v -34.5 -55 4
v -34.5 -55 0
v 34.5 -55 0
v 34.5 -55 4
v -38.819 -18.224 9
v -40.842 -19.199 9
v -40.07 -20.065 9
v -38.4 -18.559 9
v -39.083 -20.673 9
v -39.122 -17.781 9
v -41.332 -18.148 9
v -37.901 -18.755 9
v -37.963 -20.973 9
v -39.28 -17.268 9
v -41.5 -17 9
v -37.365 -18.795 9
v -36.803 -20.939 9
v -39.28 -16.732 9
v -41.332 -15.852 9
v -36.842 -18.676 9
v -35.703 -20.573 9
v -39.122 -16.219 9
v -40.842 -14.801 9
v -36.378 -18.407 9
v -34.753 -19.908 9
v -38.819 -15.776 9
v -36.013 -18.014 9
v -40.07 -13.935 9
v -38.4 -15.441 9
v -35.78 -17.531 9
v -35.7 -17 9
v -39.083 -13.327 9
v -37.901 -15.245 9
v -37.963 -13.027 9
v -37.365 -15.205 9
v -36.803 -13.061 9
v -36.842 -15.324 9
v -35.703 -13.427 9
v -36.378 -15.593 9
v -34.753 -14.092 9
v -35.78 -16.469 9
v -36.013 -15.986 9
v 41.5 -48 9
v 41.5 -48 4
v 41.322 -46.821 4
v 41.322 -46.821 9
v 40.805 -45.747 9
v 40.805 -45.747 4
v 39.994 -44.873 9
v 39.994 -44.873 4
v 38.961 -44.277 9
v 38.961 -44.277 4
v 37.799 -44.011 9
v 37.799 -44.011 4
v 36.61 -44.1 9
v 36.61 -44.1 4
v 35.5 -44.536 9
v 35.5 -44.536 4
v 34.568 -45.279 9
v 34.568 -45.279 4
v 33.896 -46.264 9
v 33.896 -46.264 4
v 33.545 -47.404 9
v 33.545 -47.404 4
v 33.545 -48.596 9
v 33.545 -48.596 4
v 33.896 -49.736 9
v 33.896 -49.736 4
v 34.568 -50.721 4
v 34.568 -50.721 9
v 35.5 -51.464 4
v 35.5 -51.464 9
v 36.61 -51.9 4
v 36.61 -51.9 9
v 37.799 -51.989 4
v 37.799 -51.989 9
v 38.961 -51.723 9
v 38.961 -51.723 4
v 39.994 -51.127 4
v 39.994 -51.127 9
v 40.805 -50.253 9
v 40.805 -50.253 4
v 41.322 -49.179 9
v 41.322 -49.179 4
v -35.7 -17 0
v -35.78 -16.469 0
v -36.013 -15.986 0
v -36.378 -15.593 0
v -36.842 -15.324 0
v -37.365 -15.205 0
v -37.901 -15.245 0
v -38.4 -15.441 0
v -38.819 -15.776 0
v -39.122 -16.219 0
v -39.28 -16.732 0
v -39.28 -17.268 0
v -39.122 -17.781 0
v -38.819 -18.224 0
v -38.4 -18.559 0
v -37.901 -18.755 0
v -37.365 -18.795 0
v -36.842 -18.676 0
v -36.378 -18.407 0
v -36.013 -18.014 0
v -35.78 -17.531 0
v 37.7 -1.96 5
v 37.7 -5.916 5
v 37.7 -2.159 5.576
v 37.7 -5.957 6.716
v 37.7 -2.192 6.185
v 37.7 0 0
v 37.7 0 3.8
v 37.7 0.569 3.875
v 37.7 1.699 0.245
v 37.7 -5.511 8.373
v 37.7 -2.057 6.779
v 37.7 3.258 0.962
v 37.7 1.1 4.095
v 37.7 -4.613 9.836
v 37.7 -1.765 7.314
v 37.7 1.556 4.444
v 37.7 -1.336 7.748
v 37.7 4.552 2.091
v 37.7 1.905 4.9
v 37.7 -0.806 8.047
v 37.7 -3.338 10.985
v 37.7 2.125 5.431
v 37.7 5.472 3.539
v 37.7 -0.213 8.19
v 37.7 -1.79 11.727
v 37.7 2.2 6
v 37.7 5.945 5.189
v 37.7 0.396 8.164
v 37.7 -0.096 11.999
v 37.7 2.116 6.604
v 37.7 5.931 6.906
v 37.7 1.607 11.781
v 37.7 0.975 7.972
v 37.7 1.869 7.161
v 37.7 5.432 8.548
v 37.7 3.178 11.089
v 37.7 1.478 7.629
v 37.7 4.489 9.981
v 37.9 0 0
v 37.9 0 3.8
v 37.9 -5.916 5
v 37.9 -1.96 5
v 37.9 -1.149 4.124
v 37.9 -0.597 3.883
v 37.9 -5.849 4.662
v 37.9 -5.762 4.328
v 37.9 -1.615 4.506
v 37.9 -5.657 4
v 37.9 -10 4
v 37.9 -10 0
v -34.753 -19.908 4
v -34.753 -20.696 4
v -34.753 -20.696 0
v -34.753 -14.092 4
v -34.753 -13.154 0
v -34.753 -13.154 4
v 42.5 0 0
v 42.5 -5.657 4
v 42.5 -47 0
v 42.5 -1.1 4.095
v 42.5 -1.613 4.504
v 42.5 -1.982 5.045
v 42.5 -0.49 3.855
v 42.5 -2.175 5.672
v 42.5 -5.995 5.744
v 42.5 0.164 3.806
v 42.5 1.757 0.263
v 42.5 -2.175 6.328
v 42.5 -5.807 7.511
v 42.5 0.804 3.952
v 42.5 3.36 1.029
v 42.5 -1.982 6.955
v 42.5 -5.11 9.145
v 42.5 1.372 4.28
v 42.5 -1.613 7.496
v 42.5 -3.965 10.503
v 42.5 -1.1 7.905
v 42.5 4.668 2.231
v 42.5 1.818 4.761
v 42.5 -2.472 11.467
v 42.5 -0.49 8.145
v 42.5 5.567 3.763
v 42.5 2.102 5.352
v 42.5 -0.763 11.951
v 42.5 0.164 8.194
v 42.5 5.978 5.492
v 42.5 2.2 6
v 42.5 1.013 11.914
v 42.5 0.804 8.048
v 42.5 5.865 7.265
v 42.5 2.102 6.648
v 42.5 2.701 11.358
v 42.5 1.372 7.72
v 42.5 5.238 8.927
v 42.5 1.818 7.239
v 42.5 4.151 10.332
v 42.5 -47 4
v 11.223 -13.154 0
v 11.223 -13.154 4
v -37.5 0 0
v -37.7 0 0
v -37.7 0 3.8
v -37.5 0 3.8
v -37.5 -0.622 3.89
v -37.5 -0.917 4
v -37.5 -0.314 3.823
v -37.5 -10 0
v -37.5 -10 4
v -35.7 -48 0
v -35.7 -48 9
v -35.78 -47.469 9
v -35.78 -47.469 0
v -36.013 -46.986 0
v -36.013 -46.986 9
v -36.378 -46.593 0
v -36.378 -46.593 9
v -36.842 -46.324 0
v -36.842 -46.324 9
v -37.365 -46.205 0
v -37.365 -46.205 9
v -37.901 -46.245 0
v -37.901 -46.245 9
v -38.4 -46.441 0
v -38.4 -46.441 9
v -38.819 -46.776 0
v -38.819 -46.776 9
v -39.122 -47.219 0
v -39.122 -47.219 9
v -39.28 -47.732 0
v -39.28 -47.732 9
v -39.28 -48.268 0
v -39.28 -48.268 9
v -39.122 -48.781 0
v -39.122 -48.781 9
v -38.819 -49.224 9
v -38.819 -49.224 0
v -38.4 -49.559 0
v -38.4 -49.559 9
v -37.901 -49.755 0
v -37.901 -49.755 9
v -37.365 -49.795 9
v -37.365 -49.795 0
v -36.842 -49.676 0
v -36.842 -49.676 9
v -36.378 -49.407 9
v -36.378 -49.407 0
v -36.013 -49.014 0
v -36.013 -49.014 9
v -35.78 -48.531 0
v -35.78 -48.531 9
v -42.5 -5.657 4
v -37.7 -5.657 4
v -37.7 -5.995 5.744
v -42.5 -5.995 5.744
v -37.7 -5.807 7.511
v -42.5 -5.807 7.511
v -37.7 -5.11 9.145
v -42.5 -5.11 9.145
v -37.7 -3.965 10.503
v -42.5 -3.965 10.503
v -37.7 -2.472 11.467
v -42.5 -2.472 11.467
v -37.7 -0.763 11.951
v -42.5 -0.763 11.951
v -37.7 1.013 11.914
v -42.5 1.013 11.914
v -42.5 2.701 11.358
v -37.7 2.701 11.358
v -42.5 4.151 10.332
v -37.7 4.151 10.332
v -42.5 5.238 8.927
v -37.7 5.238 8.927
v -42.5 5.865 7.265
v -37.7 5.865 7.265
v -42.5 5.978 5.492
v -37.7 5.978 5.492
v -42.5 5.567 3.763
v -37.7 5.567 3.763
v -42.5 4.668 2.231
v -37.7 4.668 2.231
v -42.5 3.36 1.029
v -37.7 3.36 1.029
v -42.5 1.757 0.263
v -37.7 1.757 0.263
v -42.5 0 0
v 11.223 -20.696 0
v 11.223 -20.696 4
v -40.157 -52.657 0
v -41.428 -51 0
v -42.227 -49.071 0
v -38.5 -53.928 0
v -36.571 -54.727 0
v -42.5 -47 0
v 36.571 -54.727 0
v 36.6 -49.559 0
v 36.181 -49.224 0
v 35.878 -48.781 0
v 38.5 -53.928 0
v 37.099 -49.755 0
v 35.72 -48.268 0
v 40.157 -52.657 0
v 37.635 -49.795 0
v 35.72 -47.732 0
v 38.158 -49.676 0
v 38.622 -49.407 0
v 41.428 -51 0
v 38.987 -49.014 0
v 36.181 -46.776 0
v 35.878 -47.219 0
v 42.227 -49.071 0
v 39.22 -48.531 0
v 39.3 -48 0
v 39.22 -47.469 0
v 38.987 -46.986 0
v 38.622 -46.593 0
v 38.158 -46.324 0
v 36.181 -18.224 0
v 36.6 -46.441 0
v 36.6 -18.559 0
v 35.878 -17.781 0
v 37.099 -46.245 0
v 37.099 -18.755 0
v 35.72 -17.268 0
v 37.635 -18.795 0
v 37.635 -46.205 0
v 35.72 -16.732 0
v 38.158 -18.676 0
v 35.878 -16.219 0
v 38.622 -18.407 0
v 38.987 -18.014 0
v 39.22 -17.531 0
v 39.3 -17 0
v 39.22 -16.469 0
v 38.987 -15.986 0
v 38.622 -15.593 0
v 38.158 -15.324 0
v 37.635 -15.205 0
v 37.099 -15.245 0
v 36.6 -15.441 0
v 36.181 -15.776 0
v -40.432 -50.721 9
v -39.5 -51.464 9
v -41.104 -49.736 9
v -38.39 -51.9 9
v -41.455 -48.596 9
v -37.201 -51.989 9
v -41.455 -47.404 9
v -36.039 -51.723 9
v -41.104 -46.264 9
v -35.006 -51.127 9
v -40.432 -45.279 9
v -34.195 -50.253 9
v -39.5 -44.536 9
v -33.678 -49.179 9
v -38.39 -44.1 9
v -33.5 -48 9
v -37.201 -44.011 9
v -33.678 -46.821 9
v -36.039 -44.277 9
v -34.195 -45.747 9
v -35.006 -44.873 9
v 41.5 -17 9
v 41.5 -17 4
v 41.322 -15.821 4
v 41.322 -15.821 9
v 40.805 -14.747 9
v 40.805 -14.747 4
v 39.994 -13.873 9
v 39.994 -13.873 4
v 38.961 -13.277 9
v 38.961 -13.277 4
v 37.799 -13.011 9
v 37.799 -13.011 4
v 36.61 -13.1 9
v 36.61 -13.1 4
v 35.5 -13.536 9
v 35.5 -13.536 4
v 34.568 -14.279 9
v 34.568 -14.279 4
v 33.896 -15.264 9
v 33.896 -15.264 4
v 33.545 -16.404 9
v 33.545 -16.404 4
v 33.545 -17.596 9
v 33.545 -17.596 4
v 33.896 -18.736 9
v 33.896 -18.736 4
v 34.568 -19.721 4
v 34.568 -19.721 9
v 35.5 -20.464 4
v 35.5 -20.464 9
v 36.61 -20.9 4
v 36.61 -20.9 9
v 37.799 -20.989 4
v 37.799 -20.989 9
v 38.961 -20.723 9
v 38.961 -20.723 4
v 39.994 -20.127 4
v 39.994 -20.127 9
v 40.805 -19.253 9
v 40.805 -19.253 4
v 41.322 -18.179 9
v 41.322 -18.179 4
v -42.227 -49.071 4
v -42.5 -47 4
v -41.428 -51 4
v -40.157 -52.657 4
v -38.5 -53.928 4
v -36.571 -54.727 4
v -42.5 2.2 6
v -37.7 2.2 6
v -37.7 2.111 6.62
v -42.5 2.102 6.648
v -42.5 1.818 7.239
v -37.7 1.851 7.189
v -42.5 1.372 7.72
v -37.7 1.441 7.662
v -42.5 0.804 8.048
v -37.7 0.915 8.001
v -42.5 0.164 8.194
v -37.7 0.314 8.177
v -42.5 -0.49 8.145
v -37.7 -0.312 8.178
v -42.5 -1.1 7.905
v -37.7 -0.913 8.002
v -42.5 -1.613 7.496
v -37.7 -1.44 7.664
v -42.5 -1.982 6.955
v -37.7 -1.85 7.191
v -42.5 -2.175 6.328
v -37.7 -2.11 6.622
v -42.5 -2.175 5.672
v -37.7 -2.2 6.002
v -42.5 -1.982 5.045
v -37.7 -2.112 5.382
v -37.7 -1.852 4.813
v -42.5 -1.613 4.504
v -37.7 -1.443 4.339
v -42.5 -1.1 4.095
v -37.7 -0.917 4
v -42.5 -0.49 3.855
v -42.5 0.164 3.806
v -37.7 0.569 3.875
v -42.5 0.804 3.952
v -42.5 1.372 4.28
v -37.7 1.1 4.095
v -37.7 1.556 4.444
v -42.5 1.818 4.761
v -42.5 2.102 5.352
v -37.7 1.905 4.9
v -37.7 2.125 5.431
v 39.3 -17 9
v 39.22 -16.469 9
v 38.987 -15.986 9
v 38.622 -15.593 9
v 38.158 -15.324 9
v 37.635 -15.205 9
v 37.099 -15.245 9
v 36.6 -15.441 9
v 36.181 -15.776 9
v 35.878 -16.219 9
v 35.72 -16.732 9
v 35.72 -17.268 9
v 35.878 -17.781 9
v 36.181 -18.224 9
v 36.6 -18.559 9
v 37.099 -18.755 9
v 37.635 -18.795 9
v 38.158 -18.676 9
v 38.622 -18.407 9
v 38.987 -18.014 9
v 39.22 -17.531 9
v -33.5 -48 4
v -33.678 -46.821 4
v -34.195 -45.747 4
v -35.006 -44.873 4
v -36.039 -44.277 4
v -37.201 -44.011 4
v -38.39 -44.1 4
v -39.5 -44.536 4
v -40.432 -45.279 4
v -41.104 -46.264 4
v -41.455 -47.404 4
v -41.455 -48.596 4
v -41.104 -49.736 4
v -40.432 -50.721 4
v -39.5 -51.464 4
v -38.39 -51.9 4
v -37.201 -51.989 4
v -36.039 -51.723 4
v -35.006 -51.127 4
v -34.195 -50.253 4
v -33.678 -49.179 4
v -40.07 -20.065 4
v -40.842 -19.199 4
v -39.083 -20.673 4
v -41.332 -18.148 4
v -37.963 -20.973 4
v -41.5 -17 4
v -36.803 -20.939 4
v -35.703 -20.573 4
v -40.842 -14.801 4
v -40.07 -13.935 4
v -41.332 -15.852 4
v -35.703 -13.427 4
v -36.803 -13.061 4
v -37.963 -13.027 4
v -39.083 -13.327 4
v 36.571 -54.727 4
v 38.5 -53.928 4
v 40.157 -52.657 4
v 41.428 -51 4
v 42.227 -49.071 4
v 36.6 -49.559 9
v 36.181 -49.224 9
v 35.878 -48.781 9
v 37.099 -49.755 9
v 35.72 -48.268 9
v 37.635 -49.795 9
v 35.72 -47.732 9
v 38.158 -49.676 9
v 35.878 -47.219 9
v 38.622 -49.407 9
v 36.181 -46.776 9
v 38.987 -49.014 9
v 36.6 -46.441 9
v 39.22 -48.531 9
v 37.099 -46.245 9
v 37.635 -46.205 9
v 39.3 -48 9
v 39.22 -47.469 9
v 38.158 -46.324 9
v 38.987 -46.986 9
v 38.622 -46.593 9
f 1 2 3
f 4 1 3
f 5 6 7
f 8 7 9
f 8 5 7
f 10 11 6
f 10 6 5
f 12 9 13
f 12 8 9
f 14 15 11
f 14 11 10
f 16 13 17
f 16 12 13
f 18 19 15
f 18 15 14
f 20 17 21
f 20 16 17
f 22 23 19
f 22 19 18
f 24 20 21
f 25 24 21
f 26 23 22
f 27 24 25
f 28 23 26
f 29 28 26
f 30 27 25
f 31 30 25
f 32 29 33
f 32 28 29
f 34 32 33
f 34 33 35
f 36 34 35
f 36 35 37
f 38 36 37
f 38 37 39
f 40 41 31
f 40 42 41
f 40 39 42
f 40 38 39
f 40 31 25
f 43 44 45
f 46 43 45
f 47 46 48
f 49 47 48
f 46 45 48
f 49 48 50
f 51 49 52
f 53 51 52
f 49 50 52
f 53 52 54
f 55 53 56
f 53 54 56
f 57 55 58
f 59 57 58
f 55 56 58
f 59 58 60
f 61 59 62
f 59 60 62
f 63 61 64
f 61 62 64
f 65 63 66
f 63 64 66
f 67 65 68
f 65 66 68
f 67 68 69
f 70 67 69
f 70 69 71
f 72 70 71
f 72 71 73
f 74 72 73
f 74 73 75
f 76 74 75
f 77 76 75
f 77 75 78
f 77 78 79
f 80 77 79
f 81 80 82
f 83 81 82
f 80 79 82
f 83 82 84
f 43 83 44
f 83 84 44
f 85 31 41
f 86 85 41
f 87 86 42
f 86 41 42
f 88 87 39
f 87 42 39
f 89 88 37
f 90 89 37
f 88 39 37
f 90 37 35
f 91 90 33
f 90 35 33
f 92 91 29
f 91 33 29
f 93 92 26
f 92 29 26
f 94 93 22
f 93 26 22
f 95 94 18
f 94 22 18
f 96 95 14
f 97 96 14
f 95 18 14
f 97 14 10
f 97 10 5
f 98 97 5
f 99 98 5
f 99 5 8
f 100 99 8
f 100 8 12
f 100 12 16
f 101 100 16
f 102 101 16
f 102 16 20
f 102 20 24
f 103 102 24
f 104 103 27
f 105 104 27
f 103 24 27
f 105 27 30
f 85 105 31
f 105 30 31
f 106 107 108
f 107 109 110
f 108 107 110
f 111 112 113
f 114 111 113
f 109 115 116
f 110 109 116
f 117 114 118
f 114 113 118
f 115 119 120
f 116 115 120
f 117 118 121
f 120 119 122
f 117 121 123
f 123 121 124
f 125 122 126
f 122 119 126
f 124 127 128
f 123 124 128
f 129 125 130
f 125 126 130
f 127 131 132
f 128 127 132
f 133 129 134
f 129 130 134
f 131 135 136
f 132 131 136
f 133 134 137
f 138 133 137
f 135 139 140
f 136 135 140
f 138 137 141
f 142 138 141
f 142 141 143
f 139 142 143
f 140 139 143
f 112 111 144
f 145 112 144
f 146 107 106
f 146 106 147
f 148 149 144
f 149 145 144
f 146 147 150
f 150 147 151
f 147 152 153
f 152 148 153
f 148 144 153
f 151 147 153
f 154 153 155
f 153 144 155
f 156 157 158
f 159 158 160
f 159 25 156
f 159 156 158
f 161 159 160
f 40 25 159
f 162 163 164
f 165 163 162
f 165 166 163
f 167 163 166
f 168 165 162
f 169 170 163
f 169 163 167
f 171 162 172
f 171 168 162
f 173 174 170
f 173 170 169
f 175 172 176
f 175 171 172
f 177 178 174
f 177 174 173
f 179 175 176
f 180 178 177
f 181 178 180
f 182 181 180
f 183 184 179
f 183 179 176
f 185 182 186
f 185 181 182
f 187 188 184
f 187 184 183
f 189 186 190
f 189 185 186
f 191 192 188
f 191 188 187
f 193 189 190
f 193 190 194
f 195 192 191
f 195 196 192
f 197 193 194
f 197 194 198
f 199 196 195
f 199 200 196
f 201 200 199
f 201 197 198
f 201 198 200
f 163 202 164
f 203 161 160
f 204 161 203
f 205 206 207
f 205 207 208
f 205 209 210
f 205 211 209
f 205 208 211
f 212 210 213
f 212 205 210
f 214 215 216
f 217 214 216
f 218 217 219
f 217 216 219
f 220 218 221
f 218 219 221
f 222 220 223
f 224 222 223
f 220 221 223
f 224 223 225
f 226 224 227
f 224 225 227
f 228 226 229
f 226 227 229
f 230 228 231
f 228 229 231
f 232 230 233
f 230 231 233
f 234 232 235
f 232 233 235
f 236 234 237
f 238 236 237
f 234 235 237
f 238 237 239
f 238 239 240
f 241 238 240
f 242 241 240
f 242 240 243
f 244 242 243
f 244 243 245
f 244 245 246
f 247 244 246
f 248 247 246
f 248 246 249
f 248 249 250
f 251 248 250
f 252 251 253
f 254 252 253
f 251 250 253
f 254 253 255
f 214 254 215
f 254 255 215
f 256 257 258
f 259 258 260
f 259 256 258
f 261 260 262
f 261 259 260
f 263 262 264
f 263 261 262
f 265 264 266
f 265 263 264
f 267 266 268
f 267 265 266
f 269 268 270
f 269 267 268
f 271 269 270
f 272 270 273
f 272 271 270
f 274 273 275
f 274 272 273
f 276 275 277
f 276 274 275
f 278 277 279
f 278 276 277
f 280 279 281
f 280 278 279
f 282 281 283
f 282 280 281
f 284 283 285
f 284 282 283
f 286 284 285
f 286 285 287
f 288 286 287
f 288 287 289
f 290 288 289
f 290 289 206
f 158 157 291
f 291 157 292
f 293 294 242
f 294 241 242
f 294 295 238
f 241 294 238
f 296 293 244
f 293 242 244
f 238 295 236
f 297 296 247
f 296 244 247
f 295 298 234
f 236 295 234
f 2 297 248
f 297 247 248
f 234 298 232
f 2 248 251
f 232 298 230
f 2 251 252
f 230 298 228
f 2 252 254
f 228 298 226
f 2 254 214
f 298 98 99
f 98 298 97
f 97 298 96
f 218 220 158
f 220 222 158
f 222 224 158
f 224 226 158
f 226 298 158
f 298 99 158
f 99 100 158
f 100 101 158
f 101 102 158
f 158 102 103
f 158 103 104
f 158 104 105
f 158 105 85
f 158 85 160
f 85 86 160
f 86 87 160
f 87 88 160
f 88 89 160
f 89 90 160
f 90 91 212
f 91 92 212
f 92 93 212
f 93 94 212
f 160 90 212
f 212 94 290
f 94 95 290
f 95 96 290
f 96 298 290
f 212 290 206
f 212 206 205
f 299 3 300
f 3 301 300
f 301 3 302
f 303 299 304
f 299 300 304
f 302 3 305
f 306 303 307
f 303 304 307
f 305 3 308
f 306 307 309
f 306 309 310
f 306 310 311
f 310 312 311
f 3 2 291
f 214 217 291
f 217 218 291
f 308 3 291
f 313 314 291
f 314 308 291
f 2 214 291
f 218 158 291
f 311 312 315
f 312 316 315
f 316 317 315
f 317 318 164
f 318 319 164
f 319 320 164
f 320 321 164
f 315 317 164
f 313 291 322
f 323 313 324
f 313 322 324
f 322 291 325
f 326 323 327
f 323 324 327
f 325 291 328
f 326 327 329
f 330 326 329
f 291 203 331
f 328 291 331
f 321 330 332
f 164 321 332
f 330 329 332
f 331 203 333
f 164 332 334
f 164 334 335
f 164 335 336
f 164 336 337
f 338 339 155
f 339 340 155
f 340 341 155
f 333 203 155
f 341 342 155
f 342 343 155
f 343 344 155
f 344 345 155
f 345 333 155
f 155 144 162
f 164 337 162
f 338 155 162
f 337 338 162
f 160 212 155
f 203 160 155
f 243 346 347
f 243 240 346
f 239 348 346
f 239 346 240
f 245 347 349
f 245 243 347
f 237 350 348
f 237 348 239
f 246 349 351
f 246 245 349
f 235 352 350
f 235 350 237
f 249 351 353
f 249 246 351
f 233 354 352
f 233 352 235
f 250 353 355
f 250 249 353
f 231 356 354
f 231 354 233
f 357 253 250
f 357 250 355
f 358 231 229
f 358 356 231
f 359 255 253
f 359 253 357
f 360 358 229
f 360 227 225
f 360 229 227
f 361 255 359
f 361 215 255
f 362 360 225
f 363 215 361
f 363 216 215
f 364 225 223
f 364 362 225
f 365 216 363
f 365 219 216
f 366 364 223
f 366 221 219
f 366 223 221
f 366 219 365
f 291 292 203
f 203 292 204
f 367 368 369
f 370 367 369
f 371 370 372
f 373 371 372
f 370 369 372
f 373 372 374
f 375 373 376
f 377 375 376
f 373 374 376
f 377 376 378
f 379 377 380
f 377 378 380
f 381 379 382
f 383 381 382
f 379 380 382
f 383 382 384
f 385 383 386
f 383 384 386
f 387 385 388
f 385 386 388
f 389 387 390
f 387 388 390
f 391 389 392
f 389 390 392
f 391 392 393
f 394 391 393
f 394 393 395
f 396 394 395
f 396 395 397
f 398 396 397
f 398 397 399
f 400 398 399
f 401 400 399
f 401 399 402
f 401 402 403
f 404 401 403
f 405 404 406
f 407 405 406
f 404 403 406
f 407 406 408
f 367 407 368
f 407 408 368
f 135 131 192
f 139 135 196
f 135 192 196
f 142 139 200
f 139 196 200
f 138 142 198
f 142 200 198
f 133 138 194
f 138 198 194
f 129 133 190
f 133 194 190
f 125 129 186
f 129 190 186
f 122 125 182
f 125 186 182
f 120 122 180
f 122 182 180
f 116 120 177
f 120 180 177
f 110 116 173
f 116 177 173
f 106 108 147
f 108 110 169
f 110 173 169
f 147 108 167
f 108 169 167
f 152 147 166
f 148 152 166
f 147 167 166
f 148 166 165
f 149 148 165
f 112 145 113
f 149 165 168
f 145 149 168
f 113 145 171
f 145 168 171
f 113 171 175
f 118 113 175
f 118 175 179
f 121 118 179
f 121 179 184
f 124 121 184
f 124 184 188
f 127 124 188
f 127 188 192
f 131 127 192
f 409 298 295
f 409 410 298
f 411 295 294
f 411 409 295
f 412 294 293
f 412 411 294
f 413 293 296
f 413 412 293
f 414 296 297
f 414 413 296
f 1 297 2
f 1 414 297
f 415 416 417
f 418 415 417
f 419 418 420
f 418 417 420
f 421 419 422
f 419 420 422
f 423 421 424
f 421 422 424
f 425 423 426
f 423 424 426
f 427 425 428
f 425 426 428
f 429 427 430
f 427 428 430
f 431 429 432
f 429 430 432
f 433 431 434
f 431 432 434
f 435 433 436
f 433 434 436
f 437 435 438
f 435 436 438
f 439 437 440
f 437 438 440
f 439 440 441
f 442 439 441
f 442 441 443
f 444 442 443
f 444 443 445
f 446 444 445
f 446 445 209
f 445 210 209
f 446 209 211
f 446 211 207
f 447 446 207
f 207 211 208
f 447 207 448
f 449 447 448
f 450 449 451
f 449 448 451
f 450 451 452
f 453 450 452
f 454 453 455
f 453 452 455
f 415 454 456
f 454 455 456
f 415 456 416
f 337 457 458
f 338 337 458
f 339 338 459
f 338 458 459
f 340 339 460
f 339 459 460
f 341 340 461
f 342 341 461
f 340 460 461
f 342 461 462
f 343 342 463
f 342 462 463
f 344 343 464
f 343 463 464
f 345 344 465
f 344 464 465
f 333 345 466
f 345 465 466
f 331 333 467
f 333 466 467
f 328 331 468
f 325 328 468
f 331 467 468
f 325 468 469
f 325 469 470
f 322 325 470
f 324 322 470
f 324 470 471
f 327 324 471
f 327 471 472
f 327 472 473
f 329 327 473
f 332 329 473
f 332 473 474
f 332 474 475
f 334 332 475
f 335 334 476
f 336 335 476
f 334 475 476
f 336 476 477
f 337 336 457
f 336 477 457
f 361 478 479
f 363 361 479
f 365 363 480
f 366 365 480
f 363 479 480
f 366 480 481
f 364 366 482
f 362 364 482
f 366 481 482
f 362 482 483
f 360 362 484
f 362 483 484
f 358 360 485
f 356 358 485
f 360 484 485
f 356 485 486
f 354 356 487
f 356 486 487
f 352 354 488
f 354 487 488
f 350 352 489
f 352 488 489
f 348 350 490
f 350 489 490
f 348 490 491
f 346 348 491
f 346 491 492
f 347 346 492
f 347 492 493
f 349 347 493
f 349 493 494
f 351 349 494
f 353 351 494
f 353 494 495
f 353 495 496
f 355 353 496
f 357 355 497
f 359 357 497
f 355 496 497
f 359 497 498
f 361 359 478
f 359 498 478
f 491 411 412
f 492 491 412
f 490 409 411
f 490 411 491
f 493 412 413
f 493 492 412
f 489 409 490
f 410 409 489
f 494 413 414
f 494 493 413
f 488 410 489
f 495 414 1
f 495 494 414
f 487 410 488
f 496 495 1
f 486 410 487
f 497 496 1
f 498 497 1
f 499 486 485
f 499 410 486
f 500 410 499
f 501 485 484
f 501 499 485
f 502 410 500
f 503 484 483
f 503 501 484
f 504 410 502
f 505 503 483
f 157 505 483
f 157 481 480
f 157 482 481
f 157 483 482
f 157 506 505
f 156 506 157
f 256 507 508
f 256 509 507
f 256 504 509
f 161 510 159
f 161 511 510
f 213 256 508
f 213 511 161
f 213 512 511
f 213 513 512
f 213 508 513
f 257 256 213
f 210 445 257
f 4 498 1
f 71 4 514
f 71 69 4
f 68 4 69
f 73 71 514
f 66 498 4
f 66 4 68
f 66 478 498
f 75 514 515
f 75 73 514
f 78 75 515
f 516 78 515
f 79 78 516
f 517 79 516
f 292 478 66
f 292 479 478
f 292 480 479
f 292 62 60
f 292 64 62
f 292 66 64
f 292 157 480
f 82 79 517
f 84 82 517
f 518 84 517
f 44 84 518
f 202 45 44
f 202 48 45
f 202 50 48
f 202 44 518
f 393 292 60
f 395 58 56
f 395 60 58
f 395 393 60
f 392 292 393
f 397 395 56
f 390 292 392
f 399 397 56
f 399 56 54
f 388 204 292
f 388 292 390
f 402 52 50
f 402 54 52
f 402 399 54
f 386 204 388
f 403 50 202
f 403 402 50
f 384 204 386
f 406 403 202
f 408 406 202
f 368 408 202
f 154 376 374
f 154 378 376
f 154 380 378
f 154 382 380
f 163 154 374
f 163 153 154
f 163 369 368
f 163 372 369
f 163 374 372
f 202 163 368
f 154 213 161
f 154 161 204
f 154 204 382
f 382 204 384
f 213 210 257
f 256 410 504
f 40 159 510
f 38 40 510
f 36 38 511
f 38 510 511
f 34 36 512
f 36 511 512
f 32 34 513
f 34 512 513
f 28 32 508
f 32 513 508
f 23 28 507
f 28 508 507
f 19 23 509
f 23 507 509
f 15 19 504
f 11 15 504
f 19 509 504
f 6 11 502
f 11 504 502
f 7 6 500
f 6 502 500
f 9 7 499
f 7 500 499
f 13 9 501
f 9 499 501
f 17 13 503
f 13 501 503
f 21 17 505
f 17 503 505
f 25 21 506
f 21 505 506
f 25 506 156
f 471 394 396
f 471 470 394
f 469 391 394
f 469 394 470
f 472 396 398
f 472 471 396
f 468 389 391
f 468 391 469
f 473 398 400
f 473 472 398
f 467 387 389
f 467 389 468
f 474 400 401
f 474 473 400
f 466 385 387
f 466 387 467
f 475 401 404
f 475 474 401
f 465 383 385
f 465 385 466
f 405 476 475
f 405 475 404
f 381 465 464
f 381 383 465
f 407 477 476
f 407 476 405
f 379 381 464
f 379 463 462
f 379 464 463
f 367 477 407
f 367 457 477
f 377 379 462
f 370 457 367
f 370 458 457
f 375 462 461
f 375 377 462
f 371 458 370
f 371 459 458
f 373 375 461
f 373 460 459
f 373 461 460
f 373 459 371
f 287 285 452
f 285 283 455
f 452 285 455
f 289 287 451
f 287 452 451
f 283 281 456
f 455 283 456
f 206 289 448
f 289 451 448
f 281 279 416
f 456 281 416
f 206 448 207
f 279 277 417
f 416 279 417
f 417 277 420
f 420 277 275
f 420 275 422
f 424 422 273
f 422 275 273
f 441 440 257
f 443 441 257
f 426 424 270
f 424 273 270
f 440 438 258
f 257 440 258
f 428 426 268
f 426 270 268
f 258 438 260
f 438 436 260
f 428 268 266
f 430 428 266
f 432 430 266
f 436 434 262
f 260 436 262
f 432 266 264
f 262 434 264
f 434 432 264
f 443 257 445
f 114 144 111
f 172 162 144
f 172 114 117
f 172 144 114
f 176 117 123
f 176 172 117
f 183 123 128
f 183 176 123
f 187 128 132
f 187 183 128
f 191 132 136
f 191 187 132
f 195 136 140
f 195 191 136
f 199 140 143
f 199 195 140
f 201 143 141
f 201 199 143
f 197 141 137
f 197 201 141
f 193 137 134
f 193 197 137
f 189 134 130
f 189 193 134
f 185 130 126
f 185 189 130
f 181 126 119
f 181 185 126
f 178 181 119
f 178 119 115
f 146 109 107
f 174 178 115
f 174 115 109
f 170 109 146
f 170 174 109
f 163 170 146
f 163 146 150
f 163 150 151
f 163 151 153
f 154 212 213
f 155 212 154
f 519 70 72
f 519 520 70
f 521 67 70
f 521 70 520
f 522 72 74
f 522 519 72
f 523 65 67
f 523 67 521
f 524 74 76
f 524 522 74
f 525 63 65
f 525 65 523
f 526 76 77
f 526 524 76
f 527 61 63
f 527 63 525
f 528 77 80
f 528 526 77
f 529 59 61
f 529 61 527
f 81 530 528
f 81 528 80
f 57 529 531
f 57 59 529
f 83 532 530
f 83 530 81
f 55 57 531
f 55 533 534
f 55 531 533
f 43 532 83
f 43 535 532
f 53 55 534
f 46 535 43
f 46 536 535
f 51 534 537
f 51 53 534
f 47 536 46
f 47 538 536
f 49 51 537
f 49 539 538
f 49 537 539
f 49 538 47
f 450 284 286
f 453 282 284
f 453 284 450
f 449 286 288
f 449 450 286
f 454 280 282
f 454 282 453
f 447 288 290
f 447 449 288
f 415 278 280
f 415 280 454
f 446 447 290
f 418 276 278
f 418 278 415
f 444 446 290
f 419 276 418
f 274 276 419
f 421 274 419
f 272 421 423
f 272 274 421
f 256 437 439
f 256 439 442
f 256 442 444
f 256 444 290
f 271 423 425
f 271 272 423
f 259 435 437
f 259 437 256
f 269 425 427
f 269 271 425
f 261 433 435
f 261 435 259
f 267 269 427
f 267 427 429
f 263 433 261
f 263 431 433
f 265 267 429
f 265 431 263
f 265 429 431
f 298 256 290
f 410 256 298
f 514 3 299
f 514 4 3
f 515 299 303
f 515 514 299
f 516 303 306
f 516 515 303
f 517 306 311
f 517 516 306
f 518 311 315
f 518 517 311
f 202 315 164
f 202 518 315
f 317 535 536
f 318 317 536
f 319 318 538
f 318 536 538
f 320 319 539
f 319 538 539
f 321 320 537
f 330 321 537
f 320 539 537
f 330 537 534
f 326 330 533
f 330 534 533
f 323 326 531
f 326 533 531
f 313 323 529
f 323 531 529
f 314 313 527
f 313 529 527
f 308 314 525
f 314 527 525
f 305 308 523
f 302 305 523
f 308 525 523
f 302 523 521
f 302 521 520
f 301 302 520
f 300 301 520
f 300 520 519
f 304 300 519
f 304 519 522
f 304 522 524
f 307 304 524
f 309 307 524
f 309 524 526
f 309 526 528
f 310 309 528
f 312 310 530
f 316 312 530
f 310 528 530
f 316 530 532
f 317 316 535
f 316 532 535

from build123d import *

# Parameters (mm, degrees)
SKETCH_W        = 85
SKETCH_H        = 55
PAD_DEPTH       = 4
SKETCH001_R     = 6
PAD001_DEPTH    = 4.8
SKETCH002_R     = 6
PAD002_DEPTH    = 4.8
SKETCH003_W     = 75.4
SKETCH003_H     = 10
POCKET_DEPTH    = 5
SKETCH008_R     = 2.2
POCKET001_DEPTH = 85
SKETCH005_R     = 4
PAD003_DEPTH    = 5
SKETCH006_R     = 1.8
POCKET002_DEPTH = 9
SKETCH007_W     = 45.975895
SKETCH007_H     = 7.541788
POCKET003_DEPTH = 9
FILLET_R        = 8
FILLET001_R     = 8


with BuildPart() as part:
    # Sketch → Pad (new body)
    with BuildSketch(Plane.XY):
        with Locations((0, -27.5)):
            Rectangle(SKETCH_W, SKETCH_H)
    extrude(amount=PAD_DEPTH)

    # Sketch001 (on Face2 of Pad) → Pad001 (join)
    with BuildSketch(Plane.YZ.offset(42.5)):
        with Locations((0, 6)):
            Circle(SKETCH001_R)
    extrude(amount=-PAD001_DEPTH)

    # Sketch002 (on Face5 of Pad001) → Pad002 (join)
    with BuildSketch(Plane(origin=(-42.5, 0, 0), x_dir=(0, -1, 0), z_dir=(-1, 0, 0))):
        with Locations((0, 6)):
            Circle(SKETCH002_R)
    extrude(amount=-PAD002_DEPTH)

    # Sketch003 (on Face6 of Pad002) → Pocket (cut)
    with BuildSketch(Plane(origin=(0, 0, 0), x_dir=(1, 0, 0), z_dir=(0, 0, -1))):
        with Locations((0.2, 5)):
            Rectangle(SKETCH003_W, SKETCH003_H)
    extrude(amount=-POCKET_DEPTH, mode=Mode.SUBTRACT)

    # Sketch008 (on Face20 of Pocket) → Pocket001 (cut)
    with BuildSketch(Plane.YZ.offset(42.5)):
        with Locations((0, 6)):
            Circle(SKETCH008_R)
    extrude(amount=-POCKET001_DEPTH, mode=Mode.SUBTRACT)

    # Sketch005 (on Face8 of Pocket001) → Pad003 (join)
    with BuildSketch(Plane.XY.offset(4)):
        with Locations((-37.5, -17)):
            Circle(SKETCH005_R)
        with Locations((37.5, -17)):
            Circle(SKETCH005_R)
        with Locations((37.5, -48)):
            Circle(SKETCH005_R)
        with Locations((-37.5, -48)):
            Circle(SKETCH005_R)
    extrude(amount=PAD003_DEPTH)

    # Sketch006 → Pocket002 (cut)
    with BuildSketch(Plane.XY.offset(9)):
        with Locations((-37.5, -17)):
            Circle(SKETCH006_R)
        with Locations((-37.5, -48)):
            Circle(SKETCH006_R)
        with Locations((37.5, -48)):
            Circle(SKETCH006_R)
        with Locations((37.5, -17)):
            Circle(SKETCH006_R)
    extrude(amount=-POCKET002_DEPTH, mode=Mode.SUBTRACT)

    # Sketch007 → Pocket003 (cut)
    with BuildSketch(Plane.XY.offset(9)):
        with Locations((-11.765078, -16.925255)):
            Rectangle(SKETCH007_W, SKETCH007_H)
    extrude(amount=-POCKET003_DEPTH, mode=Mode.SUBTRACT)

    # Fillet
    fillet_edges = [part.edges().sort_by_distance(p)[0] for p in [
        (-42.5, -55, 2),
    ]]
    fillet(fillet_edges, radius=FILLET_R)

    # Fillet001
    fillet001_edges = [part.edges().sort_by_distance(p)[0] for p in [
        (42.5, -55, 2),
    ]]
    fillet(fillet001_edges, radius=FILLET001_R)


solid = part.part
